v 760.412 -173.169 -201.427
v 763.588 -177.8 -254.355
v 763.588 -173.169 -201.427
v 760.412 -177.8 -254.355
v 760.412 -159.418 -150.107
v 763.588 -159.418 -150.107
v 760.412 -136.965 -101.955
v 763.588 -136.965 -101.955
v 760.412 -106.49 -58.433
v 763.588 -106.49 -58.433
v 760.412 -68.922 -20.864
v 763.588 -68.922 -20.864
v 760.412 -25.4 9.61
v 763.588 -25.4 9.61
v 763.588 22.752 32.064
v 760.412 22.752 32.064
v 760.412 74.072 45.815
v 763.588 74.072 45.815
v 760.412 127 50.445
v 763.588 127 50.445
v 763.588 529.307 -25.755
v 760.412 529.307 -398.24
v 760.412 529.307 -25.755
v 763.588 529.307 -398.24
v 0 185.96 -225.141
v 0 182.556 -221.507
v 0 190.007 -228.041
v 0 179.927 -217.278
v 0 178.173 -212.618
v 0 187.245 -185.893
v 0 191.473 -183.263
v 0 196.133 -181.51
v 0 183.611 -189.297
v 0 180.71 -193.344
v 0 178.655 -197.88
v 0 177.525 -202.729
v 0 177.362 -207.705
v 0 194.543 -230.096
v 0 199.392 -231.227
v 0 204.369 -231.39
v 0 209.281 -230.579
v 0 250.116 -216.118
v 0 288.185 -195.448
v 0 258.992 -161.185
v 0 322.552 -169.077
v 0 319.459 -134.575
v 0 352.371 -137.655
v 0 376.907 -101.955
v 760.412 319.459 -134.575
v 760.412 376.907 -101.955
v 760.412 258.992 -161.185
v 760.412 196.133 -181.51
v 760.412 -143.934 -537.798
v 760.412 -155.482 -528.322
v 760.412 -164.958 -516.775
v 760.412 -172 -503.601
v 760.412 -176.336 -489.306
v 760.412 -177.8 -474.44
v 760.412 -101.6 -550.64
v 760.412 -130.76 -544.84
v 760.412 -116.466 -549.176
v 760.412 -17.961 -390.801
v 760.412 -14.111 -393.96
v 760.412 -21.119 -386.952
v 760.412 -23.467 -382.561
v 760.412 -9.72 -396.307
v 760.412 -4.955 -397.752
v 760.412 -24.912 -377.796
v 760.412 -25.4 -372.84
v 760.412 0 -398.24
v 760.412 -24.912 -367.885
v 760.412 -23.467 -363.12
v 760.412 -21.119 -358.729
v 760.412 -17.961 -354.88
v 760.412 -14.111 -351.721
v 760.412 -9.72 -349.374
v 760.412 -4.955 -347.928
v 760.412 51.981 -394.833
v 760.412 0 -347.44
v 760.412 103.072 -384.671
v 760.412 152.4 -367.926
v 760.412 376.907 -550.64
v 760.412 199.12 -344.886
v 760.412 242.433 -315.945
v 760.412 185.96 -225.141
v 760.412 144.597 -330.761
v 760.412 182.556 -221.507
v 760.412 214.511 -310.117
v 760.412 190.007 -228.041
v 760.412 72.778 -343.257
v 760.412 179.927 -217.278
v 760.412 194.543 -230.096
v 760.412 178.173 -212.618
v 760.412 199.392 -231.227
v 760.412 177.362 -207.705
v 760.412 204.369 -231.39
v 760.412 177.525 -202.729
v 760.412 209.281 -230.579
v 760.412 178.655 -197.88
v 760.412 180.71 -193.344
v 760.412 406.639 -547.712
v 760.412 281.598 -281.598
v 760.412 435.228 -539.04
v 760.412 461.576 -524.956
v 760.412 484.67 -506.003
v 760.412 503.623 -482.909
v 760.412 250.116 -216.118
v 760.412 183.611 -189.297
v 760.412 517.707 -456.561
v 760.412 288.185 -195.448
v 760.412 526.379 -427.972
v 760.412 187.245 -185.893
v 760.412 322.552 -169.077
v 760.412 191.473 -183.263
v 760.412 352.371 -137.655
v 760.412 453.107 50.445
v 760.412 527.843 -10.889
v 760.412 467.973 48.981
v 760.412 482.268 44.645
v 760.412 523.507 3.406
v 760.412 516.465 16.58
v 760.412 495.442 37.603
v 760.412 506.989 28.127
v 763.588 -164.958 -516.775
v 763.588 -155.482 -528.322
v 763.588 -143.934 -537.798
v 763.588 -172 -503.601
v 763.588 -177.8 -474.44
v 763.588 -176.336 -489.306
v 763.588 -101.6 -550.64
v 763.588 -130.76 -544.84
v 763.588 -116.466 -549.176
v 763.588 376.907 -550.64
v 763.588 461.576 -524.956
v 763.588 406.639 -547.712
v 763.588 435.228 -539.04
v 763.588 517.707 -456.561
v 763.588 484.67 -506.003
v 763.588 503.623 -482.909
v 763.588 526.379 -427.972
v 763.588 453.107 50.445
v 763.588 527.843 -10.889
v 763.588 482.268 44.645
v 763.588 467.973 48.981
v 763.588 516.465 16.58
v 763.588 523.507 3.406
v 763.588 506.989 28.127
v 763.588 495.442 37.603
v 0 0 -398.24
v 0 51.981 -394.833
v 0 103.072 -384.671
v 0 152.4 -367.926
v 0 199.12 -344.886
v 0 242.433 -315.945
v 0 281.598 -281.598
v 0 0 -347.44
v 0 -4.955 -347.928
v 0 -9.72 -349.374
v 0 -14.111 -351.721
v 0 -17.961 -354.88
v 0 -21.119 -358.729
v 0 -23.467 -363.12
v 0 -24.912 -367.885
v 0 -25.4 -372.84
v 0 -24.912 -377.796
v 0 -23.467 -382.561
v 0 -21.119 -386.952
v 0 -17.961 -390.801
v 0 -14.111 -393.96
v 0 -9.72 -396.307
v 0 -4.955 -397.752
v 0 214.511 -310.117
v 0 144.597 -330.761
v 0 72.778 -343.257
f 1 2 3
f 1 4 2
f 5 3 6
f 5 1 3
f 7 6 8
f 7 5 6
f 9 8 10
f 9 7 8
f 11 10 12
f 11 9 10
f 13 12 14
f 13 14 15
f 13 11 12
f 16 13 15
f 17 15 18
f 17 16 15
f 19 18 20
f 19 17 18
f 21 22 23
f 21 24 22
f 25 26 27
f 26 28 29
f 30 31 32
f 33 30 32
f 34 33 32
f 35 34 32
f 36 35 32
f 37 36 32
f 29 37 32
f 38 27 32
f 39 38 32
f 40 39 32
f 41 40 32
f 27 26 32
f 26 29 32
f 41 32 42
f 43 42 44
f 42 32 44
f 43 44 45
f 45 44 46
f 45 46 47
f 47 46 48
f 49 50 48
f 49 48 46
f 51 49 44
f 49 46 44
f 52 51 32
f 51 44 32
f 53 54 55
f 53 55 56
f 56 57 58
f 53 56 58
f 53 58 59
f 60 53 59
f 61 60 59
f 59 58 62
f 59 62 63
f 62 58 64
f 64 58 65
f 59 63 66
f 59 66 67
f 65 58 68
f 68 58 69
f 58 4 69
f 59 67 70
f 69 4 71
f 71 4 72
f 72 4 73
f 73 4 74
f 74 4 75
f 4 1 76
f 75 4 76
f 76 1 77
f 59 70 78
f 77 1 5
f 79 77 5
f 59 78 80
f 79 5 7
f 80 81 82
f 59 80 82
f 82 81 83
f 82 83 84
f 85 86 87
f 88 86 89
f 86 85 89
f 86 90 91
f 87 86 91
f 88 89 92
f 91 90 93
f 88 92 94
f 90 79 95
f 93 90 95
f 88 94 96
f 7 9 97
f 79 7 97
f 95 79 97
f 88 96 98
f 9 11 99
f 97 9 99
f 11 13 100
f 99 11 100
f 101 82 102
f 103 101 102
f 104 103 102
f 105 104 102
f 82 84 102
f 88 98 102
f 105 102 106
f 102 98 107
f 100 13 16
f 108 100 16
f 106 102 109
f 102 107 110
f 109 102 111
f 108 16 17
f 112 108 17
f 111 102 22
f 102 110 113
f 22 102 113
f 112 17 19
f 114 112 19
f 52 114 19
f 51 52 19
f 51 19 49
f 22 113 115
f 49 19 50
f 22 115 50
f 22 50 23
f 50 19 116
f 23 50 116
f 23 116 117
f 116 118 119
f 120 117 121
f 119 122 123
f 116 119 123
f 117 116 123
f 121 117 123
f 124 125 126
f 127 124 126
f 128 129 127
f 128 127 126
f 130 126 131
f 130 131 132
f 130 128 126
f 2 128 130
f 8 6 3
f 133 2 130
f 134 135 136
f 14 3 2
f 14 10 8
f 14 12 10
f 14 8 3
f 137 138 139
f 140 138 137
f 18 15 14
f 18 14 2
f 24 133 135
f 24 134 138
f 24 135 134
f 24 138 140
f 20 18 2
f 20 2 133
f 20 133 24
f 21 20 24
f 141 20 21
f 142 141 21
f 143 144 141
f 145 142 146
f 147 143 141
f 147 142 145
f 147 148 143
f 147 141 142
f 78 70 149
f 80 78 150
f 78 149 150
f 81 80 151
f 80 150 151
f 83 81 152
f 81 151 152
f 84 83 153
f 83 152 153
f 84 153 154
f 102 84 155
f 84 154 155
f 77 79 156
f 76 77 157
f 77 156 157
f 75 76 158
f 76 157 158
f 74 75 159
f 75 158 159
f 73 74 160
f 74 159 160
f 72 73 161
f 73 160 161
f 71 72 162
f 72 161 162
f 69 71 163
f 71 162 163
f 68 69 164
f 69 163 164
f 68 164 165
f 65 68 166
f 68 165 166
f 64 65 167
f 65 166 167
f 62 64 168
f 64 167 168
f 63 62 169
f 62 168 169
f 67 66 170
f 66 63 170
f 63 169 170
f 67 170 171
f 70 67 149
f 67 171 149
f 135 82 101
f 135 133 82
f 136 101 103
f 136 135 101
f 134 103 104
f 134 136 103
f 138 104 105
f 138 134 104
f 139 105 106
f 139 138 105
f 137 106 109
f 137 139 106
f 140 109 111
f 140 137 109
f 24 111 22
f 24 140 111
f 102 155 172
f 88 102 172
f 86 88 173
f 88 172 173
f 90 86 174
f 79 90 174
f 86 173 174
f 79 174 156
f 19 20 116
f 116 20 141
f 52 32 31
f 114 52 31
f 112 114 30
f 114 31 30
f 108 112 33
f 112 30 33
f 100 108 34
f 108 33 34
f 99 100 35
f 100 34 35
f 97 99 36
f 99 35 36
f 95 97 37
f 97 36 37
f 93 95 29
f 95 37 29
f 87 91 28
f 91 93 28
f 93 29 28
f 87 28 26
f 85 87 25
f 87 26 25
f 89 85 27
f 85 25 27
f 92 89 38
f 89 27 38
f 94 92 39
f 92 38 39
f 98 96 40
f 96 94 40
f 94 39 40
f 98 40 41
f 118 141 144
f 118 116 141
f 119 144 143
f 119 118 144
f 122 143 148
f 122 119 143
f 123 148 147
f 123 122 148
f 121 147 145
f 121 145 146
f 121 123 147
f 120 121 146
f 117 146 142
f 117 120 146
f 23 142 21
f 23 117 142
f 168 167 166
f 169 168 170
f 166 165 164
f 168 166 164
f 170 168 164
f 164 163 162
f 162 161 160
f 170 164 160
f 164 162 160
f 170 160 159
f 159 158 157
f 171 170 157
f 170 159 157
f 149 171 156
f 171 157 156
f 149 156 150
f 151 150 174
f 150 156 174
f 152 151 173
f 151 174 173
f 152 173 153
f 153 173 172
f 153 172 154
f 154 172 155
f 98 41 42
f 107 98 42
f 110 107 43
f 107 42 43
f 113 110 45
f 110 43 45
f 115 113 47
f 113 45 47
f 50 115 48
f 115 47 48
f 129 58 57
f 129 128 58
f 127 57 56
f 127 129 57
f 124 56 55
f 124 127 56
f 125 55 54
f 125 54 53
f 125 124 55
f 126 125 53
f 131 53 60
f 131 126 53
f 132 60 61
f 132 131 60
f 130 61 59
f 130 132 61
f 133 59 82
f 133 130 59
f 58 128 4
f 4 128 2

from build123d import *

# Parameters (mm, degrees)
F1_DEPTH = 762
F3_DEPTH = 762
F4_W     = 707.107375
F4_H     = 601.085796
F5_DEPTH = 1.5875
F6_R     = 304.8
F7_R     = 76.2
F8_R     = 152.4


with BuildPart() as f1:
    # F0 (on Right) → F1 (new body)
    with BuildSketch(Plane.YZ):
        with BuildLine():
            ThreePointArc((0, -347.440392), (-25.4, -372.840392), (0, -398.240392))
            ThreePointArc((0, -398.240392), (152.4, -367.926147), (281.598482, -281.598482))
            ThreePointArc((281.598482, -281.598482), (144.596734, -330.76089), (0, -347.440392))
        make_face()
    extrude(amount=F1_DEPTH)



with BuildPart() as f3:
    # F2 (on Right) → F3 (new body)
    with BuildSketch(Plane.YZ):
        with BuildLine():
            ThreePointArc((196.133325, -181.509551), (178.172813, -212.61807), (209.281333, -230.578583))
            ThreePointArc((209.281333, -230.578583), (305.886805, -182.938036), (376.907375, -101.954596))
            ThreePointArc((376.907375, -101.954596), (289.564758, -148.649932), (196.133325, -181.509551))
        make_face()
    extrude(amount=F3_DEPTH)


with BuildPart() as f1_1:
    add(f1.part)

    add(f3.part)  # F5 merges F3
    # F4 (on face) → F5 (join, symmetric)
    with BuildSketch(Plane.YZ.offset(762)):
        with Locations((175.753688, -250.097494)):
            Rectangle(F4_W, F4_H)
        with BuildLine():
            ThreePointArc((0, -347.440392), (144.596734, -330.76089), (281.598482, -281.598482))
            ThreePointArc((281.598482, -281.598482), (152.4, -367.926147), (0, -398.240392))
            ThreePointArc((0, -398.240392), (-25.4, -372.840392), (0, -347.440392))
        make_face(mode=Mode.SUBTRACT)
        with BuildLine():
            ThreePointArc((0, -398.240392), (152.4, -367.926147), (281.598482, -281.598482))
            ThreePointArc((281.598482, -281.598482), (144.596734, -330.76089), (0, -347.440392))
            ThreePointArc((0, -347.440392), (-25.4, -372.840392), (0, -398.240392))
        make_face()
    extrude(amount=F5_DEPTH, both=True)

    # F6
    f6_edges = [f1_1.edges().sort_by_distance(p)[0] for p in [
        (762, -177.8, 50.445404),
    ]]
    fillet(f6_edges, radius=F6_R)

    # F7
    f7_edges = [f1_1.edges().sort_by_distance(p)[0] for p in [
        (762, -177.8, -550.640392),
        (762, 529.307375, 50.445404),
    ]]
    fillet(f7_edges, radius=F7_R)

    # F8
    f8_edges = [f1_1.edges().sort_by_distance(p)[0] for p in [
        (762, 529.307375, -550.640392),
    ]]
    fillet(f8_edges, radius=F8_R)


solid = f1_1.part
